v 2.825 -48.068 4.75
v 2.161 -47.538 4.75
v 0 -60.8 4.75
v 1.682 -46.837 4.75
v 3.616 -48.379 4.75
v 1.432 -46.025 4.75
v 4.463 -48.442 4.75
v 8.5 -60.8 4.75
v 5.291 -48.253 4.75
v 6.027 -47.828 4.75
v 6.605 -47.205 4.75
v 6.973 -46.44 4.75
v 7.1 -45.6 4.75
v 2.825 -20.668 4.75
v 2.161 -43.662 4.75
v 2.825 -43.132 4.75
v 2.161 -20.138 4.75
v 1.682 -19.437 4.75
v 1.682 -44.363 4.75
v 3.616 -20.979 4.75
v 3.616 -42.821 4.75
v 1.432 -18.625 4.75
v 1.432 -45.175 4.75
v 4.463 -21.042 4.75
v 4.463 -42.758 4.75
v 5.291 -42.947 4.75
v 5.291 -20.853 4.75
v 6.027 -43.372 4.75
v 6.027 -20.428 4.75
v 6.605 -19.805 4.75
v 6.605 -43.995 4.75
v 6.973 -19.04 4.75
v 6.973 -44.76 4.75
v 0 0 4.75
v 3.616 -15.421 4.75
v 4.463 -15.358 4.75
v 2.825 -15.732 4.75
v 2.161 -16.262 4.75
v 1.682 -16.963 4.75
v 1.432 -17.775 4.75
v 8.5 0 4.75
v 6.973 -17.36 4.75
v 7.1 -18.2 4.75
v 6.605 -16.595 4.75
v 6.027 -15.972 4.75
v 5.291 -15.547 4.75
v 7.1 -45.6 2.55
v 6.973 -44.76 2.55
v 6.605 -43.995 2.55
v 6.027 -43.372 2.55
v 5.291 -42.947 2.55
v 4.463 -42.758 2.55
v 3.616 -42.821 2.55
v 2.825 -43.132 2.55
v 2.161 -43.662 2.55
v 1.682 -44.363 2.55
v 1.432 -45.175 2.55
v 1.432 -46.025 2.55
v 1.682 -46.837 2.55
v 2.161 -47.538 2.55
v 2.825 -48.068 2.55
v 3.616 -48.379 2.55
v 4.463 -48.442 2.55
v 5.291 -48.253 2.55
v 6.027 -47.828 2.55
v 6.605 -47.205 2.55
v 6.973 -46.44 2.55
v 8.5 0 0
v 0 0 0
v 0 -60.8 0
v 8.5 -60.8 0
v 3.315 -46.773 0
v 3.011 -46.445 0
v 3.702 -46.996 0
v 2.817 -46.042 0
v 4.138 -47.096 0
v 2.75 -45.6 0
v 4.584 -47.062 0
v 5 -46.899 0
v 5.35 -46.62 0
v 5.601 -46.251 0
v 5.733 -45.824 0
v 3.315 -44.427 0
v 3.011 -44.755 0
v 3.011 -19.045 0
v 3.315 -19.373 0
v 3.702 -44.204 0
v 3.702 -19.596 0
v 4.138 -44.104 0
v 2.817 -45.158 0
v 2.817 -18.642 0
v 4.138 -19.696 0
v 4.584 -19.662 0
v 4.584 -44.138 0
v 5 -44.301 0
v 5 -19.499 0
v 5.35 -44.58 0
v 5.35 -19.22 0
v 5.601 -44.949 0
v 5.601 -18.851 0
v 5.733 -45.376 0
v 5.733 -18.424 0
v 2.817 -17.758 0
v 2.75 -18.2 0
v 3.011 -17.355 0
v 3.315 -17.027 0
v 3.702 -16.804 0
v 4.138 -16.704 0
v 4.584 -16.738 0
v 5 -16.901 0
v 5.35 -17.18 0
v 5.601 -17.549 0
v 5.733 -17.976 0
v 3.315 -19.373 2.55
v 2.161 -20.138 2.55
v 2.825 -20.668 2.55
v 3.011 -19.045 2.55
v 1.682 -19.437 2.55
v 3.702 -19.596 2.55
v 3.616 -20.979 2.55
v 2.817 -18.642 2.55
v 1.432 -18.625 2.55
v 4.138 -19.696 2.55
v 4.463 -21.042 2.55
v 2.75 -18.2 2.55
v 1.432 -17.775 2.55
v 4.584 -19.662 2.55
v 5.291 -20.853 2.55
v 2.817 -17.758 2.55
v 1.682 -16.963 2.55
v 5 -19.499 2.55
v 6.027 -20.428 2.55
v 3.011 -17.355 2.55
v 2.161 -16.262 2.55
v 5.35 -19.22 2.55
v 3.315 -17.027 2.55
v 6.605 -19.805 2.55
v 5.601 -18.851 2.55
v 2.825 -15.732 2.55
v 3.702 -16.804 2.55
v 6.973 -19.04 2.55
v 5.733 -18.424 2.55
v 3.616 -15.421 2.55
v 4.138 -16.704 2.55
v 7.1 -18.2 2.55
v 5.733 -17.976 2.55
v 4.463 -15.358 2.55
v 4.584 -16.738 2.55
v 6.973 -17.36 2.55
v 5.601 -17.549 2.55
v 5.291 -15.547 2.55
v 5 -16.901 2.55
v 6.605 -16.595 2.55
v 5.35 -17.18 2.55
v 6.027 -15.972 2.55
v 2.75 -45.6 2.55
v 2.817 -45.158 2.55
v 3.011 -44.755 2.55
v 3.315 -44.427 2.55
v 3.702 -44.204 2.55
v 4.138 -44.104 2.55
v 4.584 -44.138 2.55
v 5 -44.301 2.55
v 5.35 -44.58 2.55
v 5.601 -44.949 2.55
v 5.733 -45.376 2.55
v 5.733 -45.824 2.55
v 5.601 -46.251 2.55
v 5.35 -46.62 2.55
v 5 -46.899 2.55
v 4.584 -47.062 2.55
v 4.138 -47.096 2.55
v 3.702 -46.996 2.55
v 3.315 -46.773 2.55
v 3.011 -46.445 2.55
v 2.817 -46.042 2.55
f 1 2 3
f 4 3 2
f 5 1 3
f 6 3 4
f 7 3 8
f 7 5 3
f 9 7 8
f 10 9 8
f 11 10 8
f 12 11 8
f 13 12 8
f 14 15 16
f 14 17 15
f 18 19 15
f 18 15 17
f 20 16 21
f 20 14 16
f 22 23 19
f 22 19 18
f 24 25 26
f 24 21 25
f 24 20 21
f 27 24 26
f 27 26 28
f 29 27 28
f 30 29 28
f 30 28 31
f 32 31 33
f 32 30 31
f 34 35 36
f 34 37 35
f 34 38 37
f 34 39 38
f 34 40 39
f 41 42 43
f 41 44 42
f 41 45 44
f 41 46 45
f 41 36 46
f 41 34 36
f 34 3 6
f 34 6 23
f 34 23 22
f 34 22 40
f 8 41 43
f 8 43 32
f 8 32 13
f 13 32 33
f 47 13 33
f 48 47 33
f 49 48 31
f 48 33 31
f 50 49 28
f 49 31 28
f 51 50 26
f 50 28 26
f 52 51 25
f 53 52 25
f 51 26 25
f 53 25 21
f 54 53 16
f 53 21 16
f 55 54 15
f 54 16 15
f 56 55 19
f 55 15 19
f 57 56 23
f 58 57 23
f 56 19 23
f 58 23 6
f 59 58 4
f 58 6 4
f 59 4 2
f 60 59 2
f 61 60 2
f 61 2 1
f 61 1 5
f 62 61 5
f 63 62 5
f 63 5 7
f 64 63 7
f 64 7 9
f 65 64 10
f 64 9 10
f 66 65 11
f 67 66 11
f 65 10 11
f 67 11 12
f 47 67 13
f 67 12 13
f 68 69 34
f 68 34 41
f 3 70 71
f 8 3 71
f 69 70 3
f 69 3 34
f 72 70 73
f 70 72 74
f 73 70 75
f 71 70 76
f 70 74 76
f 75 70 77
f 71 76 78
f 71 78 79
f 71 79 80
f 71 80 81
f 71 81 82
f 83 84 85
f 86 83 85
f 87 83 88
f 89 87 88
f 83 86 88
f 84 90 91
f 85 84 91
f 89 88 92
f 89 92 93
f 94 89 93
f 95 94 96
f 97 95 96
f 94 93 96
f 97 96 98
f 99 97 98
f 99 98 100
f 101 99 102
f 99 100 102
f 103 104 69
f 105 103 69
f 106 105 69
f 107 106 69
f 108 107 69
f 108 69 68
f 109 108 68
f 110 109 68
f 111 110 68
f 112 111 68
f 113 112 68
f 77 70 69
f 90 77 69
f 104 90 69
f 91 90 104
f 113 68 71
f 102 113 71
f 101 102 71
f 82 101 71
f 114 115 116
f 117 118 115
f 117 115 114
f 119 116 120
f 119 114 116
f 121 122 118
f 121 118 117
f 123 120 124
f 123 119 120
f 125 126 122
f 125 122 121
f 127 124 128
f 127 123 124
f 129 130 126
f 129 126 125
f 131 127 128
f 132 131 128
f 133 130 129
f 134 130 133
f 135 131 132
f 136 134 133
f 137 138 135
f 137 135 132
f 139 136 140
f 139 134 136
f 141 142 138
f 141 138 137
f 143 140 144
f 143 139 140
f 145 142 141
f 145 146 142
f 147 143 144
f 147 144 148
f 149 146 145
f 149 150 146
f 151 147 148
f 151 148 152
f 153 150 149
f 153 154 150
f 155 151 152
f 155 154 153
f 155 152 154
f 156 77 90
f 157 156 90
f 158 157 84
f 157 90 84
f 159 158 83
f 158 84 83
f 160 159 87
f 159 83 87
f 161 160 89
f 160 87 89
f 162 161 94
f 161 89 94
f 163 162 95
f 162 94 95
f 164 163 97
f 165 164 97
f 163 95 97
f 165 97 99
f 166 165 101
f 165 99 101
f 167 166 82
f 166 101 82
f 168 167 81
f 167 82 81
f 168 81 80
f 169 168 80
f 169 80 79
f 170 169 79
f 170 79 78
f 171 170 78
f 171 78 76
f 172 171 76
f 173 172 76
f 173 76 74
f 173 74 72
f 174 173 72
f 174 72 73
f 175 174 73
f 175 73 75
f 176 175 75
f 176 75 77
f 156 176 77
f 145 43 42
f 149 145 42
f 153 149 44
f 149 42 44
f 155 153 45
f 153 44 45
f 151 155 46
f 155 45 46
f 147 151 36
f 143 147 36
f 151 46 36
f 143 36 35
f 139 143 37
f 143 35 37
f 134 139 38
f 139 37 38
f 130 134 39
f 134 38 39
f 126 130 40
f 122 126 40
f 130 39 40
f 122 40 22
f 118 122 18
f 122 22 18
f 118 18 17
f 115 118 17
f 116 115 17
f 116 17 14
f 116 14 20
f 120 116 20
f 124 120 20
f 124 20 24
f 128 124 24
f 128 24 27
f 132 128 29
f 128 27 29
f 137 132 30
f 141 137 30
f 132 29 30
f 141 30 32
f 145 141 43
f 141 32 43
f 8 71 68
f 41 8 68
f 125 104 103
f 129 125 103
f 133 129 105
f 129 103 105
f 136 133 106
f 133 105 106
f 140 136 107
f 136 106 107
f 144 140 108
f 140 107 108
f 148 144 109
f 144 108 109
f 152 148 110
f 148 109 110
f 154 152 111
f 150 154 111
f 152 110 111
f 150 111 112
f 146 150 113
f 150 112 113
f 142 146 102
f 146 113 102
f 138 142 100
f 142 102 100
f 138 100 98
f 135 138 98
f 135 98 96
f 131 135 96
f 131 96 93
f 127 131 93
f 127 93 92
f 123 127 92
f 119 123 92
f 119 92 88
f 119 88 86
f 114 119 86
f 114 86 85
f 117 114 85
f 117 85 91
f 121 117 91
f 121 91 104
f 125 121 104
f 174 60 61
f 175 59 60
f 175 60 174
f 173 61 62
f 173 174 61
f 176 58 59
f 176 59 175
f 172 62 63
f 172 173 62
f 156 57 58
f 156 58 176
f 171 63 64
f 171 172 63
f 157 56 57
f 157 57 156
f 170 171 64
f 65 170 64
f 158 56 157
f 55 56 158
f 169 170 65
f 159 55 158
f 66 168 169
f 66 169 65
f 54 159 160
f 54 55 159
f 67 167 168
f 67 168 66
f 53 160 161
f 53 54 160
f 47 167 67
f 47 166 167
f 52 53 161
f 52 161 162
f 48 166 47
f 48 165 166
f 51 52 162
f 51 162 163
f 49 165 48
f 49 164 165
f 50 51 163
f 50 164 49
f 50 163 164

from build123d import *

# Parameters (mm, degrees)
SKETCH1_W                 = 8.5
SKETCH1_H                 = 60.8
BOSS_EXTRUDE1_DEPTH       = 4.75
F_3_0MM_DOWEL_HOLE1_D     = 3
F_3_0MM_DOWEL_HOLE1_DEPTH = 5
F_3_0MM_DOWEL_HOLE1_TIP   = 0.901290929
SKETCH6_R                 = 2.85
CUT_EXTRUDE1_DEPTH        = 2.2


with BuildPart() as part:
    # Sketch1 → Boss-Extrude1 (new body)
    with BuildSketch(Plane.XY):
        with Locations((4.25, -30.4)):
            Rectangle(SKETCH1_W, SKETCH1_H)
    extrude(amount=BOSS_EXTRUDE1_DEPTH)

    # Ø3.0mm Dowel Hole1
    with Locations(Plane.XY.offset(4.75)):
        with Locations((4.25, -18.2), (4.25, -45.6)):
            Hole(F_3_0MM_DOWEL_HOLE1_D / 2, depth=F_3_0MM_DOWEL_HOLE1_DEPTH)
            with Locations((0, 0, -(F_3_0MM_DOWEL_HOLE1_DEPTH + F_3_0MM_DOWEL_HOLE1_TIP / 2))):  # 118° drill point
                Cone(0, F_3_0MM_DOWEL_HOLE1_D / 2, F_3_0MM_DOWEL_HOLE1_TIP, mode=Mode.SUBTRACT)

    # Sketch6 → Cut-Extrude1 (cut)
    with BuildSketch(Plane.XY.offset(4.75)):
        with Locations((4.25, -18.2)):
            Circle(SKETCH6_R)
        with Locations((4.25, -45.6)):
            Circle(SKETCH6_R)
    extrude(amount=-CUT_EXTRUDE1_DEPTH, mode=Mode.SUBTRACT)


solid = part.part
